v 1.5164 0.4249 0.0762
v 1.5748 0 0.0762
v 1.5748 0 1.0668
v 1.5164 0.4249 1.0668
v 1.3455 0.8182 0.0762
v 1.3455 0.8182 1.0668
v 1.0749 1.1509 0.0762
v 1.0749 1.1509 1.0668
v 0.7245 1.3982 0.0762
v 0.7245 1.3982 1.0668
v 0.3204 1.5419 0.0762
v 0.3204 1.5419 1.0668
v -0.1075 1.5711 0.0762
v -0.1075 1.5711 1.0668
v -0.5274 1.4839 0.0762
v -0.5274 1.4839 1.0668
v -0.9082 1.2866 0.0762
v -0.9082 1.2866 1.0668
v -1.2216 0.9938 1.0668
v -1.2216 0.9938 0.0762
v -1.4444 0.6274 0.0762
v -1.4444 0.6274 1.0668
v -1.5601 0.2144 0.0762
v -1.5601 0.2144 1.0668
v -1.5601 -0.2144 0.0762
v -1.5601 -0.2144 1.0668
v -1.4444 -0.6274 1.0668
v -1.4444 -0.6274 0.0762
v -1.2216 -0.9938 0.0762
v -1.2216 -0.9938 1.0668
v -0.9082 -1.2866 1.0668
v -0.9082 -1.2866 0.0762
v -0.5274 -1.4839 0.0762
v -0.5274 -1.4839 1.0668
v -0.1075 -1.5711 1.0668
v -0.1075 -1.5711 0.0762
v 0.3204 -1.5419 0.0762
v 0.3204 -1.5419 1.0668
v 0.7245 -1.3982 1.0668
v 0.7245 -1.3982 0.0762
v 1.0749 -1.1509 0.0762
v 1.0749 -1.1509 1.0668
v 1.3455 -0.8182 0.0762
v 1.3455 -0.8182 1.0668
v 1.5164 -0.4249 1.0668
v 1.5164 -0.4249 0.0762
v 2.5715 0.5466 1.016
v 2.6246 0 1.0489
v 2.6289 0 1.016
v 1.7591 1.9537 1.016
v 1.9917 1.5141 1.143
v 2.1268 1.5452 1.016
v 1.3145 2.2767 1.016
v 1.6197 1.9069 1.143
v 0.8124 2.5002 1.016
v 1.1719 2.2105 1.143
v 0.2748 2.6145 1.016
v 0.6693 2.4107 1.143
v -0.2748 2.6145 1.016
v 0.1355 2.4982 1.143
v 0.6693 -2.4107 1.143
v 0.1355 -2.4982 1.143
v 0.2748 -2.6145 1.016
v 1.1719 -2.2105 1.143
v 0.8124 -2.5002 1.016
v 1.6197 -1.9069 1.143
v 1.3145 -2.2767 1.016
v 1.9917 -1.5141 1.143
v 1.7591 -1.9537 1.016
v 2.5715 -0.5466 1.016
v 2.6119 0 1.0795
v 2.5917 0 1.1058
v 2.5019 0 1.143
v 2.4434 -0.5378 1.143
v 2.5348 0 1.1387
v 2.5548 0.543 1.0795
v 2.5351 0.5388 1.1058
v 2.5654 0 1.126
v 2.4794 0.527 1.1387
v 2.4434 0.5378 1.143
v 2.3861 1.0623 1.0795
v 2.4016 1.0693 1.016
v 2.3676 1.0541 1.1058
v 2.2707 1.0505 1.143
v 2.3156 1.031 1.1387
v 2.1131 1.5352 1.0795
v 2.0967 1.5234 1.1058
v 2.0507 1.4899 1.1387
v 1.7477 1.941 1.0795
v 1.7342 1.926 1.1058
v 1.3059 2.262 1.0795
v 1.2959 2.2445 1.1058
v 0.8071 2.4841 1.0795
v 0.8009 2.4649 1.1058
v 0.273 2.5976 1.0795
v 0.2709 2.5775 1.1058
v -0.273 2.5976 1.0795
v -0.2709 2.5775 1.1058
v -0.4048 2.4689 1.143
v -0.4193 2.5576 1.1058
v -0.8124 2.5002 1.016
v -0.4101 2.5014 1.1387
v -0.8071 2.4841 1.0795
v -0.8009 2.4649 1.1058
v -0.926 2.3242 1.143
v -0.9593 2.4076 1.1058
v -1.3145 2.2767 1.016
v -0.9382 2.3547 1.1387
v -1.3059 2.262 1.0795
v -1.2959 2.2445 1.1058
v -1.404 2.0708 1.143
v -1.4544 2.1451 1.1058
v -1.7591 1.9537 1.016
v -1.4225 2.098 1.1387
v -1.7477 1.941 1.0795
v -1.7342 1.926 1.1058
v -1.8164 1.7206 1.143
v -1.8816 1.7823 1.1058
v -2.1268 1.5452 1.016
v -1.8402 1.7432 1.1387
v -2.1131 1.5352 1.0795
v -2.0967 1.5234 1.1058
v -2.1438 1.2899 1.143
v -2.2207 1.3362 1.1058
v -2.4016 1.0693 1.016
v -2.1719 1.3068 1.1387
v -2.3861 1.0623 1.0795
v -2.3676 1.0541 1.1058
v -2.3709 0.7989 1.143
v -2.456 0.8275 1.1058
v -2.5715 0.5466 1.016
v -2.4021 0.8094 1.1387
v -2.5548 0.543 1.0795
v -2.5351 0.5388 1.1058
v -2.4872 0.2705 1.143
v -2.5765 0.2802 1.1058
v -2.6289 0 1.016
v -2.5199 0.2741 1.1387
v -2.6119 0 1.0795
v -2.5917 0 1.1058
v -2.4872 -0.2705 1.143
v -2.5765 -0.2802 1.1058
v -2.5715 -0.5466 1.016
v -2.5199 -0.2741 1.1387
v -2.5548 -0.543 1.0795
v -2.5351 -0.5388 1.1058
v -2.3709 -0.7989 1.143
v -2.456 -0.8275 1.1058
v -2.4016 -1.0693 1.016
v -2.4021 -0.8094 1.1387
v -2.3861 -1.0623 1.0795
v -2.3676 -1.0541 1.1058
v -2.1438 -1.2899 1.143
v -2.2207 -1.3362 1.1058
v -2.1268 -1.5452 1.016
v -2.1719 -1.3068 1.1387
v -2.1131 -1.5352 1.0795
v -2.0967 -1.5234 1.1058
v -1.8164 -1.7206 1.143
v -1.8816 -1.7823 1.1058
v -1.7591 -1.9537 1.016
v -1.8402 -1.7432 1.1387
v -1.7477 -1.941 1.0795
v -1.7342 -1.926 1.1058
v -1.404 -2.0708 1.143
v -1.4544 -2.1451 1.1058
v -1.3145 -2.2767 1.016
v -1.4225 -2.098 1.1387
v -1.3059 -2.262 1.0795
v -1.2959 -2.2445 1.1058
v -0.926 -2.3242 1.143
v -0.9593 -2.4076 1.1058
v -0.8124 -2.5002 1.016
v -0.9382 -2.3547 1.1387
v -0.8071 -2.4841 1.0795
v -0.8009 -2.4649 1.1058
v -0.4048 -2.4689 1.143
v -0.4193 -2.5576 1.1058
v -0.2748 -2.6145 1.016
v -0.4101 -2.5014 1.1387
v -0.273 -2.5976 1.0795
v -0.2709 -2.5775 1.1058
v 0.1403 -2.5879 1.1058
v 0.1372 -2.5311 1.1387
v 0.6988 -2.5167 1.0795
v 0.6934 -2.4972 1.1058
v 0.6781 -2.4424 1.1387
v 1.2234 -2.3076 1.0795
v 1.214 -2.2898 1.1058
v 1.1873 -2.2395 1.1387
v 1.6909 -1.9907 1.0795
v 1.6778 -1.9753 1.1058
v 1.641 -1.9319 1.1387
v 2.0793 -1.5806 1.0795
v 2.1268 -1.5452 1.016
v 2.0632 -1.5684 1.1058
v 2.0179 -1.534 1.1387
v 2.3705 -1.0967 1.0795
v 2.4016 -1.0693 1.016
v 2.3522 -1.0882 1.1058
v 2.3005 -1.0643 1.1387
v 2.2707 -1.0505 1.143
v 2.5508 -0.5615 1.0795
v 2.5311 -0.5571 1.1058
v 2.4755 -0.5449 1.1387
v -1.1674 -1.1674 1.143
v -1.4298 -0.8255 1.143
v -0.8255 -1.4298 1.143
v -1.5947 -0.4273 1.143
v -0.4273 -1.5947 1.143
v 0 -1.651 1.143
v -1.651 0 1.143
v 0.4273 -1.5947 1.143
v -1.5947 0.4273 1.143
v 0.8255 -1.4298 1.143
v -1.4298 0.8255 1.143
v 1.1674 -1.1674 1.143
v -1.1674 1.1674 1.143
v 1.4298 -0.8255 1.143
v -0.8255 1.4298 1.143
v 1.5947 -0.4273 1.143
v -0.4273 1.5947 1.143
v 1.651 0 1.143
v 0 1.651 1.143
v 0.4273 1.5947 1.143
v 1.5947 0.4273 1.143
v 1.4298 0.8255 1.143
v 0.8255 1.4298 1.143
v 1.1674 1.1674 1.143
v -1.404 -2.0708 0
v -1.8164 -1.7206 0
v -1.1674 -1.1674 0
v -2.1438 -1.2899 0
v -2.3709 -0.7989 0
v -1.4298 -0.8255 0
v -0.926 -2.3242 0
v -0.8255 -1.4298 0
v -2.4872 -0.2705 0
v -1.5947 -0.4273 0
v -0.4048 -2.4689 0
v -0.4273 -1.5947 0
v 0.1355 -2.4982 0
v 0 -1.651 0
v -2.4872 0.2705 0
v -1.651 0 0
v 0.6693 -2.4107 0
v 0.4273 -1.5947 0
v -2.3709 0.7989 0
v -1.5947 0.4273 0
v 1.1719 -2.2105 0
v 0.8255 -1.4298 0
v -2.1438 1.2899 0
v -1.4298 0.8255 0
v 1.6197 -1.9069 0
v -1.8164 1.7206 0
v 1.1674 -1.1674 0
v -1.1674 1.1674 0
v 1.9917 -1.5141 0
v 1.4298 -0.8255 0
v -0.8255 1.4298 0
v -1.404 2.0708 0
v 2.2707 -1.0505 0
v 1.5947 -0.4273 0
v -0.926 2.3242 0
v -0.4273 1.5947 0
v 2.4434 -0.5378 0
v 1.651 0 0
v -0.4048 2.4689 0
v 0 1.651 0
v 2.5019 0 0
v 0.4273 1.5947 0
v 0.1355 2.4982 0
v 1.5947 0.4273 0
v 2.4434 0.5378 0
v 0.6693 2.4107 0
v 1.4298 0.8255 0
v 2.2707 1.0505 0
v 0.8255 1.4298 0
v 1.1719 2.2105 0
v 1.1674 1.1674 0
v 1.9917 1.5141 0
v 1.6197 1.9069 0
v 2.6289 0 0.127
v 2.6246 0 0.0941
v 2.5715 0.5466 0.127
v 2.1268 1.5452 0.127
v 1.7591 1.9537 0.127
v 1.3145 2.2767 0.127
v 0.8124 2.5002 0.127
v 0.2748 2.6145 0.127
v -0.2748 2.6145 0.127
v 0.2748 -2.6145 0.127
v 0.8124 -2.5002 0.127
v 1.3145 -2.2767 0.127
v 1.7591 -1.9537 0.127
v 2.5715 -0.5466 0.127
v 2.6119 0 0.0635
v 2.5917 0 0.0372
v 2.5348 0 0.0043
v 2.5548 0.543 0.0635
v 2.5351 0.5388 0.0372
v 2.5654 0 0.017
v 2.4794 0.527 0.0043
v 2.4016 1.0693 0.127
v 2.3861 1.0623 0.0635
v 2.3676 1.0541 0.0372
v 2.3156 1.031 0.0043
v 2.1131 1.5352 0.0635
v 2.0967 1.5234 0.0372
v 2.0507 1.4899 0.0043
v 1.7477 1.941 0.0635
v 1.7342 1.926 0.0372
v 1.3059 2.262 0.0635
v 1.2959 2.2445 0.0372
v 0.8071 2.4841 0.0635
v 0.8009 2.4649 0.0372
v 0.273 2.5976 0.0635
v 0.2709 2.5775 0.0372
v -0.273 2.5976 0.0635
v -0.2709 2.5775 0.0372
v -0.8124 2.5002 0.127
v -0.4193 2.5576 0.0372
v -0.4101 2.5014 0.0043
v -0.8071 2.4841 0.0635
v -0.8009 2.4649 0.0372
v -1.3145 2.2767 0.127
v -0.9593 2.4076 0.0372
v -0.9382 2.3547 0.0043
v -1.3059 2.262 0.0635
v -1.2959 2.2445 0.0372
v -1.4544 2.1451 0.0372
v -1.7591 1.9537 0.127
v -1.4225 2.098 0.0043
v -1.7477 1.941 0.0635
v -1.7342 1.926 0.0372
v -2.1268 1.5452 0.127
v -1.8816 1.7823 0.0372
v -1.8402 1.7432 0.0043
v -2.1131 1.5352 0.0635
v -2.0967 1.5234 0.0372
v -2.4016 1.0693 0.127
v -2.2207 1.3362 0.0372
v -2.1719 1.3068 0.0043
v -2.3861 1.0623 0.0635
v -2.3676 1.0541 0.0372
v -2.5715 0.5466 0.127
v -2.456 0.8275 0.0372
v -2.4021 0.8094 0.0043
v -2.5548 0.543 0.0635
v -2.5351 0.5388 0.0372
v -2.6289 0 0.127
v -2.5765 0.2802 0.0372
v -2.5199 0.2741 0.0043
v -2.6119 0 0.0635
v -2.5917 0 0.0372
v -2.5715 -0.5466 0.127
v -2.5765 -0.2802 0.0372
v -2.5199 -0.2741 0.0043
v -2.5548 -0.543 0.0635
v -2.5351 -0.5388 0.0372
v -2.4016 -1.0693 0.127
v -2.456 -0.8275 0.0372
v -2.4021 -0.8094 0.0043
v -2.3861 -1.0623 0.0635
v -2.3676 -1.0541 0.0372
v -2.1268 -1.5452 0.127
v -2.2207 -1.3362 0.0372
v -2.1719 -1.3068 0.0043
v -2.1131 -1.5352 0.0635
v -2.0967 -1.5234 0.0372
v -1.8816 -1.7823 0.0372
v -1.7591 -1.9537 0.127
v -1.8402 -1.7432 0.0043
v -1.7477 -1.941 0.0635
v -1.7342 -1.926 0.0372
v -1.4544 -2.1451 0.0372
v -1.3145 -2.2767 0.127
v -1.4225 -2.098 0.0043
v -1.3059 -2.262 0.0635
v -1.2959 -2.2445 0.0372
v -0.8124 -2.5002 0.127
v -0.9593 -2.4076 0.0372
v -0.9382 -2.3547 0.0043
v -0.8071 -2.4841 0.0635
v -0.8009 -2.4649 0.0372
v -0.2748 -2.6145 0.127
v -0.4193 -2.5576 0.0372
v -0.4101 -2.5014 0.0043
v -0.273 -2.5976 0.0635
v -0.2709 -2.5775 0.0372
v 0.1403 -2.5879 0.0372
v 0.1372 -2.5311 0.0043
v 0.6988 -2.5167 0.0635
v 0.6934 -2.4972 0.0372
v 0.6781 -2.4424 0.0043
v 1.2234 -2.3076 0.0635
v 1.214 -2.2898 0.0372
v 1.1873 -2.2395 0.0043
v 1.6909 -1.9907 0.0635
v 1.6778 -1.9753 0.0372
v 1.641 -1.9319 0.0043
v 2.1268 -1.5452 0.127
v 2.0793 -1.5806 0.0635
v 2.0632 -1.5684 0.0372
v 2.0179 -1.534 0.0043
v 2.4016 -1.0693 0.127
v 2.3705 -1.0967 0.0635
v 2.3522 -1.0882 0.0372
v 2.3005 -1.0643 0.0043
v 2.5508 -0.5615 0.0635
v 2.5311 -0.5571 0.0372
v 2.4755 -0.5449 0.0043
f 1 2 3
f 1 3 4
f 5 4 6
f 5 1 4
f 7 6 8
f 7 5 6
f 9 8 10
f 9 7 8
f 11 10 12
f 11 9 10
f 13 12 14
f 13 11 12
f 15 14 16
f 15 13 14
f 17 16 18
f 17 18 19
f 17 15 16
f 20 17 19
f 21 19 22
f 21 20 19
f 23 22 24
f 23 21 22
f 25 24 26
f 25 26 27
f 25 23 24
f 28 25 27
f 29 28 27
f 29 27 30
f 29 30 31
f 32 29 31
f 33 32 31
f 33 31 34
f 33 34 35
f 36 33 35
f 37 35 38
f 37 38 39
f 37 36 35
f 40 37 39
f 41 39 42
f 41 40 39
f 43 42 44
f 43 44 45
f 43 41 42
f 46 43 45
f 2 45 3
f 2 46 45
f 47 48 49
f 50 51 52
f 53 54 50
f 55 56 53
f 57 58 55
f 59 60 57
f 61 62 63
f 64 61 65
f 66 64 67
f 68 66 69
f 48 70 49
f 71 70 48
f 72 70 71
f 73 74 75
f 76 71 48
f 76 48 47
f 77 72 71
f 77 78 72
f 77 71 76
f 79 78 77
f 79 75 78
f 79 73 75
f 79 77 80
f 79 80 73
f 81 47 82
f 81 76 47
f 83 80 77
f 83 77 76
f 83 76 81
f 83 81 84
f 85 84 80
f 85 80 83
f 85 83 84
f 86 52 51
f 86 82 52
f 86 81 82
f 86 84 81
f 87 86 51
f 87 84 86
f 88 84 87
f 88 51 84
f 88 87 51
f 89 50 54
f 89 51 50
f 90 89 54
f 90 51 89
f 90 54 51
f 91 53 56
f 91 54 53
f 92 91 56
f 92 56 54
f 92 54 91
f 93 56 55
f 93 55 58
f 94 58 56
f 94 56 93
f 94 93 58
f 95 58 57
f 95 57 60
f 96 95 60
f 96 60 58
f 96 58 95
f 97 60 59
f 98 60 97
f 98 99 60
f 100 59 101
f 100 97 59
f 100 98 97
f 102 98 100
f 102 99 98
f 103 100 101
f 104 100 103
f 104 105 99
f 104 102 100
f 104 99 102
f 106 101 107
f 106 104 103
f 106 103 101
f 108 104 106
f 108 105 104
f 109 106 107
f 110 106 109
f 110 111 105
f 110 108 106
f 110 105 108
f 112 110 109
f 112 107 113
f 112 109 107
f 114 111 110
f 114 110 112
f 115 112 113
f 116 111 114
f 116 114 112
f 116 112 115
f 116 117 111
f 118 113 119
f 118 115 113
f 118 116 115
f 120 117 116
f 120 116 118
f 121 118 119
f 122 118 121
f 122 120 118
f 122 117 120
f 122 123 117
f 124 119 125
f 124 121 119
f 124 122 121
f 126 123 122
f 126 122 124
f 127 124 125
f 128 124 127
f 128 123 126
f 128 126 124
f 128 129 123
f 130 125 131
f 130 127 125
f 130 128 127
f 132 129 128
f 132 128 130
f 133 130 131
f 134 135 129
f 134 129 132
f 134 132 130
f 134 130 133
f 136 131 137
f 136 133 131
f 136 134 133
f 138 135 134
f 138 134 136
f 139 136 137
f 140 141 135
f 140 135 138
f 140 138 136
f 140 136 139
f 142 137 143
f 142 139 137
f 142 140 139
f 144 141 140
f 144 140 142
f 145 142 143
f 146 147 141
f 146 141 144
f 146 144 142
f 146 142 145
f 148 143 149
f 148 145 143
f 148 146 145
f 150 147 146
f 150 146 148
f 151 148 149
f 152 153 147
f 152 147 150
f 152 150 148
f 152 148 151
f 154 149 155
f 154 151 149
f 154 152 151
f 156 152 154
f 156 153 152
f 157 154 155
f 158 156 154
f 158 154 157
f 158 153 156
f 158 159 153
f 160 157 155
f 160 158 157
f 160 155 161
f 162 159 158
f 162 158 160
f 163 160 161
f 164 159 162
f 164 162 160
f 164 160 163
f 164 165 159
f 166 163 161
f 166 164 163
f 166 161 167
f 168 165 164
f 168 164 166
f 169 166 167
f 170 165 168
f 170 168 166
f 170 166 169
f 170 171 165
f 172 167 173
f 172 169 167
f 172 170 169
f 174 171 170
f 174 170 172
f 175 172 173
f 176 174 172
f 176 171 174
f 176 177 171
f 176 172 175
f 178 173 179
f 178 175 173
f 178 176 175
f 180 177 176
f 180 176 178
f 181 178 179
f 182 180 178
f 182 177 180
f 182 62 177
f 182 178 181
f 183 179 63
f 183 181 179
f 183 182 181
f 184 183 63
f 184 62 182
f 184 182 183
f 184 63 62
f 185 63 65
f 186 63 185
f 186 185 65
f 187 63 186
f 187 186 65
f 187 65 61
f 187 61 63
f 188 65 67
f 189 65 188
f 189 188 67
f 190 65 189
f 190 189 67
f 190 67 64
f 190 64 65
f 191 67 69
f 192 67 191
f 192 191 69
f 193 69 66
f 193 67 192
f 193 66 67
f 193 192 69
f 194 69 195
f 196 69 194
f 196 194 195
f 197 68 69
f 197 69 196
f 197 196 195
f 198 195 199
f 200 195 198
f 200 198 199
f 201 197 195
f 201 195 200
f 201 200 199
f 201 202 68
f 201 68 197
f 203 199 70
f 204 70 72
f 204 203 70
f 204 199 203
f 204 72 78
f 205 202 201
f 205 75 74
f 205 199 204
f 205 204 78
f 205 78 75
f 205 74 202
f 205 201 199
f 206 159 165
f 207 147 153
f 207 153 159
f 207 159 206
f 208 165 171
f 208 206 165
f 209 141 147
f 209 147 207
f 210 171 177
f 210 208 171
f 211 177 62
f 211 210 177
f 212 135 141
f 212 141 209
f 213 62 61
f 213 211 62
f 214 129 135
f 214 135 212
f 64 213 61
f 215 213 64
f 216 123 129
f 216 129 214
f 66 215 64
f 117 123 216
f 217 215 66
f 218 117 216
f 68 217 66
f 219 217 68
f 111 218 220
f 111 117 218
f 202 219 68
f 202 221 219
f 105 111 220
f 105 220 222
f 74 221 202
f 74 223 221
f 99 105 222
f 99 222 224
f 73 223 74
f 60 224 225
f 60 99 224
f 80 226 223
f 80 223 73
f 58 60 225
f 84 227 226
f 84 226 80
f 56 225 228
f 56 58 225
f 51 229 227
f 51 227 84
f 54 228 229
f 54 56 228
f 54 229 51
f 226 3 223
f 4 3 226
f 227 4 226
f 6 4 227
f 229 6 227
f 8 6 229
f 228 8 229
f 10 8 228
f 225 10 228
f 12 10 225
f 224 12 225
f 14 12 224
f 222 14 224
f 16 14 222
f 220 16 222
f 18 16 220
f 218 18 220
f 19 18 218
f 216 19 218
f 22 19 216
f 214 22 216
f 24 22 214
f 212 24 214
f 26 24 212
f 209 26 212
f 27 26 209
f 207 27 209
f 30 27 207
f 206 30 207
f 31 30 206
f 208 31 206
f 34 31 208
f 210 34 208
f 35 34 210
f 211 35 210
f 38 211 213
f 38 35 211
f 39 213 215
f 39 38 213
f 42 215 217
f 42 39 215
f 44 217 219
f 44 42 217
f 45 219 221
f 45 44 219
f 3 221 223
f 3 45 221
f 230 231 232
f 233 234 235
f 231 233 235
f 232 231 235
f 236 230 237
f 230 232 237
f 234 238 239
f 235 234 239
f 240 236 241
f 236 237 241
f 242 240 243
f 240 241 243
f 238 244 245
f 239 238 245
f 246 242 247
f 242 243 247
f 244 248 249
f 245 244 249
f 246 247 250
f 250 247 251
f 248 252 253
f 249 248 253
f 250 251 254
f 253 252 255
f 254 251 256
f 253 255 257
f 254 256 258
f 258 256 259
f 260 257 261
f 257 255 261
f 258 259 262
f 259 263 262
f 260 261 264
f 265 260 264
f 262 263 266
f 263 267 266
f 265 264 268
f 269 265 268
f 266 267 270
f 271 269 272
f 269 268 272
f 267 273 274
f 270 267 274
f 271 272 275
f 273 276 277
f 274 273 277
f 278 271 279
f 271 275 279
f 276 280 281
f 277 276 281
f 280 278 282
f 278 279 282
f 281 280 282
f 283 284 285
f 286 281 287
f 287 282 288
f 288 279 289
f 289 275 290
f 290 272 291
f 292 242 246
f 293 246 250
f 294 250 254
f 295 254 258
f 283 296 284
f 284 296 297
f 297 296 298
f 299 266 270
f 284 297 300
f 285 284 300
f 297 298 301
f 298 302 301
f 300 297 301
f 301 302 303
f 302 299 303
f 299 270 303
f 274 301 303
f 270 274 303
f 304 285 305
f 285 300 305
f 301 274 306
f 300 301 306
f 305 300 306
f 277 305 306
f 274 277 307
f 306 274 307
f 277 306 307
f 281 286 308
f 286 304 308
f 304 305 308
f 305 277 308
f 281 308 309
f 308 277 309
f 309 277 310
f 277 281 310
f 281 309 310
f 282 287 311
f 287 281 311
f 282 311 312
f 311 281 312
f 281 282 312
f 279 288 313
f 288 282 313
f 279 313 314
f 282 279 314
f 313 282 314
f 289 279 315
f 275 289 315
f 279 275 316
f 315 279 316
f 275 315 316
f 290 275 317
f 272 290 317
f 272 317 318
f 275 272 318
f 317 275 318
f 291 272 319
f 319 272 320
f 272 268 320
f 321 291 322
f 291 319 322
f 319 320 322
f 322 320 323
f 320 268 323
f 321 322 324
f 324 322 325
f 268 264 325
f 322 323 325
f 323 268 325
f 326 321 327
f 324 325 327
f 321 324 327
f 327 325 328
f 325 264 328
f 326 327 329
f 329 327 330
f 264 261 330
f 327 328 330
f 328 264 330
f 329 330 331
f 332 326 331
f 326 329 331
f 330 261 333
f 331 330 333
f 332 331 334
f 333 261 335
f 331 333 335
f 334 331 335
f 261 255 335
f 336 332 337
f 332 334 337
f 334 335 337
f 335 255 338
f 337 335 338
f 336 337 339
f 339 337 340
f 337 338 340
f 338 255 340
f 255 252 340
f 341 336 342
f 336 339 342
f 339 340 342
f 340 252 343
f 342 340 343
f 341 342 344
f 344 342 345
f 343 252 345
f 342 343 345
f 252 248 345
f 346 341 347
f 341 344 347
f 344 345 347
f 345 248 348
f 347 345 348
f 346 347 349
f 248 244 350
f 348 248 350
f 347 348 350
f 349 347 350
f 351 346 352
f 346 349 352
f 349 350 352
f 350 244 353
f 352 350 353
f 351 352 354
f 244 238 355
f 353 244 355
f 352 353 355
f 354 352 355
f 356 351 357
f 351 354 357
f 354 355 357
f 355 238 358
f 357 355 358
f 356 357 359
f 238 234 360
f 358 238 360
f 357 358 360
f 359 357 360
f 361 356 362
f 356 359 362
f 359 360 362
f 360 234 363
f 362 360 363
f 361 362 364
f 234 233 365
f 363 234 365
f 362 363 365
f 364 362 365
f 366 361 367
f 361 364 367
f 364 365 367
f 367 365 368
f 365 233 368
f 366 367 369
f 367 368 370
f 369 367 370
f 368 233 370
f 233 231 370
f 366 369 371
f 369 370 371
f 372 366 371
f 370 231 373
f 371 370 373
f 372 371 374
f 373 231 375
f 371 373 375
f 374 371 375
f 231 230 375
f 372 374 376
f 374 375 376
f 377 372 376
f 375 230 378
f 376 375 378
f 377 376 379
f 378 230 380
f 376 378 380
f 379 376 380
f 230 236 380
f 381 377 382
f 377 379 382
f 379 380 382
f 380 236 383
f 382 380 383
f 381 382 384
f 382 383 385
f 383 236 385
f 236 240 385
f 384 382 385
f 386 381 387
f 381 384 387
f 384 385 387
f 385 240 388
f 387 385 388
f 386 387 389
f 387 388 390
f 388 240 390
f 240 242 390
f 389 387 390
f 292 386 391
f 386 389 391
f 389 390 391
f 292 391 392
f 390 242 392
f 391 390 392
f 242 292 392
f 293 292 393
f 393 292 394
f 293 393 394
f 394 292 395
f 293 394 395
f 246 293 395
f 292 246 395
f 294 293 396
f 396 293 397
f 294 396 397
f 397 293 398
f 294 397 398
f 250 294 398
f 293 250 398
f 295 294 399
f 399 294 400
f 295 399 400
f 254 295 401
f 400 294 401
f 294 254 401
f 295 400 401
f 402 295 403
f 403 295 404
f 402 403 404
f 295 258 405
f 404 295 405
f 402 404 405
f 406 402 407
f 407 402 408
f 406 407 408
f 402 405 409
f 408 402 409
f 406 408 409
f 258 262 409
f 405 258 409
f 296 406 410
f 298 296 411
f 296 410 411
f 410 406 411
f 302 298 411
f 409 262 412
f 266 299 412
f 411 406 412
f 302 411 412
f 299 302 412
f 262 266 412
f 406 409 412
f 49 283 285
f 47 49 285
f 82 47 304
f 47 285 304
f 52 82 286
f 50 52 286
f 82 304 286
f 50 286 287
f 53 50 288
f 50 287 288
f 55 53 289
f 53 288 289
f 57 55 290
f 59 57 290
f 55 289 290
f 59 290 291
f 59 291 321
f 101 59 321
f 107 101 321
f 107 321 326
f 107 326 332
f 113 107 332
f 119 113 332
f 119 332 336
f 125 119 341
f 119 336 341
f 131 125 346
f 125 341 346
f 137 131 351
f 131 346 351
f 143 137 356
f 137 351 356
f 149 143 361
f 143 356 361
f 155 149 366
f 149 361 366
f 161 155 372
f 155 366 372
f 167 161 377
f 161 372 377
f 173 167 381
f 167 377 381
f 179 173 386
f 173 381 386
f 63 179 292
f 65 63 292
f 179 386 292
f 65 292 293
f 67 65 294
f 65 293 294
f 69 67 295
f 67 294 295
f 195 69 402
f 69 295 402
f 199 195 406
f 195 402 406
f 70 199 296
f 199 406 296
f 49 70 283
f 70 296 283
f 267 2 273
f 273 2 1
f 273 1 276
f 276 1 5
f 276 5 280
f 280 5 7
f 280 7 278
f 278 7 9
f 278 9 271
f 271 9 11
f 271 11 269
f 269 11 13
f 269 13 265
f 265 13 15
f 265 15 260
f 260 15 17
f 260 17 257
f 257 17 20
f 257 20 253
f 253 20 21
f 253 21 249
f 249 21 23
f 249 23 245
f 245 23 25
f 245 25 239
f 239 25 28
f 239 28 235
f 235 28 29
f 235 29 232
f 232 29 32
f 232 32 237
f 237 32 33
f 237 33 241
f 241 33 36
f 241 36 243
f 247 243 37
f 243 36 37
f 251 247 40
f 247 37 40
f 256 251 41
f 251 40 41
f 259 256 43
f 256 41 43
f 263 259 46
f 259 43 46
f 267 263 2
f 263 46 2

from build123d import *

# Parameters (mm, degrees)
SKETCH1_R           = 2.6289
SKETCH1_R_2         = 1.5748
BOSS_EXTRUDE1_DEPTH = 1.143
FILLET1_R           = 0.127
CHAMFER1_SIZE       = 0.0762


with BuildPart() as part:
    # Sketch1 → Boss-Extrude1 (new body)
    with BuildSketch(Plane.XY):
        Circle(SKETCH1_R)
        Circle(SKETCH1_R_2, mode=Mode.SUBTRACT)
    extrude(amount=BOSS_EXTRUDE1_DEPTH)

    # Fillet1
    fillet1_edges = [part.edges().sort_by_distance(p)[0] for p in [
        (-2.6289, 0, 0),
        (-2.6289, 0, 1.143),
    ]]
    fillet(fillet1_edges, radius=FILLET1_R)

    # Chamfer1
    chamfer1_edges = [part.edges().sort_by_distance(p)[0] for p in [
        (-1.5748, 0, 0),
        (-1.5748, 0, 1.143),
    ]]
    chamfer(chamfer1_edges, length=CHAMFER1_SIZE)


solid = part.part
